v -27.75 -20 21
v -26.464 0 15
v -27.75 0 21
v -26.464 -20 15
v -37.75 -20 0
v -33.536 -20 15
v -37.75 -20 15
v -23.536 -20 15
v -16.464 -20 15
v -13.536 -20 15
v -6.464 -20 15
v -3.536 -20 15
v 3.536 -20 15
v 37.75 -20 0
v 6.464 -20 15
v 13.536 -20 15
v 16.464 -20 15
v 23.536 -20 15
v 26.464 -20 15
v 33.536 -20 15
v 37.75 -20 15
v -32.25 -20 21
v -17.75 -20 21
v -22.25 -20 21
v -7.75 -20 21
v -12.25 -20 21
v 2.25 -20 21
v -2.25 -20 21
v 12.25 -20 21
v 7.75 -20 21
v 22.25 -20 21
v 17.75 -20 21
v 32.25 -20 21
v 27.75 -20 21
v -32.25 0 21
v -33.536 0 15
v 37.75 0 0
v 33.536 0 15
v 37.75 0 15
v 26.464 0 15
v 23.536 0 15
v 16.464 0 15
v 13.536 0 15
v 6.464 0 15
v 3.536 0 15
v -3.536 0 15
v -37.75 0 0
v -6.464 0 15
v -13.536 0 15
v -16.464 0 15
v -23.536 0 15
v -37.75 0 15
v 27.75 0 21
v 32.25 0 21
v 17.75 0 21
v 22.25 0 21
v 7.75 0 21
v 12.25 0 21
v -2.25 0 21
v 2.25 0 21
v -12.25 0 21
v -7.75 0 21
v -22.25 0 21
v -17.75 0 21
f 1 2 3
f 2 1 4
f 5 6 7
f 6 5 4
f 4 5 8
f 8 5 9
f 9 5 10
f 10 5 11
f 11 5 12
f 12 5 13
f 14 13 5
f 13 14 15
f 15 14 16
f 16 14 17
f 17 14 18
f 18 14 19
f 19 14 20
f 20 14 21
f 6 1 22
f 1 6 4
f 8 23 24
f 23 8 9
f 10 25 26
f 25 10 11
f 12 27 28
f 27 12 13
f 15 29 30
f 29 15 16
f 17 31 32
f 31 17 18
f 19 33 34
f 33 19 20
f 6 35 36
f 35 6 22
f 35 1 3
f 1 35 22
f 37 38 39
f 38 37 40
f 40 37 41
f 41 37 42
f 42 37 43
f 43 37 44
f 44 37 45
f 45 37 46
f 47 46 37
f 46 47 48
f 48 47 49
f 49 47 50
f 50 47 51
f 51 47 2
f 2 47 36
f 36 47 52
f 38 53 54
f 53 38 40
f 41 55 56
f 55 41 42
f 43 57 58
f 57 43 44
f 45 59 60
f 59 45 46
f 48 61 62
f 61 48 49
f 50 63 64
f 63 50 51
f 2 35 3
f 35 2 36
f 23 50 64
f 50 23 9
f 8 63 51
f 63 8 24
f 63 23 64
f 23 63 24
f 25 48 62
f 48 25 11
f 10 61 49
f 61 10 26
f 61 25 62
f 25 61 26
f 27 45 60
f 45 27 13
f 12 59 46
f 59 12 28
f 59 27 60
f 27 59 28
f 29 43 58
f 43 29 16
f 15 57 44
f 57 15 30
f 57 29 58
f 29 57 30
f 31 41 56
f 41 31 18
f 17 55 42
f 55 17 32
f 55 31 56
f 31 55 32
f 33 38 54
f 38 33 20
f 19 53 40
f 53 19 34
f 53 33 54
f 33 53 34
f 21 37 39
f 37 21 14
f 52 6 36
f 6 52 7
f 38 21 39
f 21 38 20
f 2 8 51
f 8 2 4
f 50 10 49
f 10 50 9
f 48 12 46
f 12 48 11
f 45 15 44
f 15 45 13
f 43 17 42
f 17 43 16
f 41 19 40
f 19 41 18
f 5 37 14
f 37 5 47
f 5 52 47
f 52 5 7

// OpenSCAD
$fn = 32;

// ----------------------------------------------------------------------
// Toothed rack, 7 teeth
// 10 mm pitch, 6 mm teeth
// ----------------------------------------------------------------------

// --- parameters (mm) ---
bar_w = 20;     // bar width (Y)
bar_h = 15;     // bar height (Z)
teeth = 7;      // number of teeth
pitch = 10;     // tooth pitch
tooth_h = 6;    // tooth height above the bar
root_w = 7.5;   // tooth width at the root
crest_w = 4.5;  // tooth width at the crest

// --- derived feature positions (mm) ---
span = (teeth - 1) * pitch;  // = 60   distance between the outer teeth
bar_l = span + root_w + 8;   // = 75.5   bar length: teeth plus 4 mm at each end
tooth_x = -span / 2;         // = -30   X of the first tooth
height = bar_h + tooth_h;    // = 21   overall height
feature_centers = [
  [tooth_x + 0 * pitch, -bar_w / 2],
  [tooth_x + 1 * pitch, -bar_w / 2],
  [tooth_x + 2 * pitch, -bar_w / 2],
  [tooth_x + 3 * pitch, -bar_w / 2],
  [tooth_x + 4 * pitch, -bar_w / 2],
  [tooth_x + 5 * pitch, -bar_w / 2],
  [tooth_x + 6 * pitch, -bar_w / 2]
];   // tooth centre line, drives the tooth loop

// bar with a rack of teeth, one extruded trapezoium per centre
module rack_tooth() {
  linear_extrude(height = bar_w)
    polygon(points = [
      [0, 0],
      [root_w, 0],
      [root_w / 2 + crest_w / 2, tooth_h + 1],
      [root_w / 2 - crest_w / 2, tooth_h + 1]
    ]);
}

union() {
  translate([-bar_l / 2, -bar_w, 0]) cube([bar_l, bar_w, bar_h]);
  for (centre = feature_centers)
    translate([centre[0] - root_w / 2, 0, bar_h - 1]) rotate([90, 0, 0]) rack_tooth();
}
